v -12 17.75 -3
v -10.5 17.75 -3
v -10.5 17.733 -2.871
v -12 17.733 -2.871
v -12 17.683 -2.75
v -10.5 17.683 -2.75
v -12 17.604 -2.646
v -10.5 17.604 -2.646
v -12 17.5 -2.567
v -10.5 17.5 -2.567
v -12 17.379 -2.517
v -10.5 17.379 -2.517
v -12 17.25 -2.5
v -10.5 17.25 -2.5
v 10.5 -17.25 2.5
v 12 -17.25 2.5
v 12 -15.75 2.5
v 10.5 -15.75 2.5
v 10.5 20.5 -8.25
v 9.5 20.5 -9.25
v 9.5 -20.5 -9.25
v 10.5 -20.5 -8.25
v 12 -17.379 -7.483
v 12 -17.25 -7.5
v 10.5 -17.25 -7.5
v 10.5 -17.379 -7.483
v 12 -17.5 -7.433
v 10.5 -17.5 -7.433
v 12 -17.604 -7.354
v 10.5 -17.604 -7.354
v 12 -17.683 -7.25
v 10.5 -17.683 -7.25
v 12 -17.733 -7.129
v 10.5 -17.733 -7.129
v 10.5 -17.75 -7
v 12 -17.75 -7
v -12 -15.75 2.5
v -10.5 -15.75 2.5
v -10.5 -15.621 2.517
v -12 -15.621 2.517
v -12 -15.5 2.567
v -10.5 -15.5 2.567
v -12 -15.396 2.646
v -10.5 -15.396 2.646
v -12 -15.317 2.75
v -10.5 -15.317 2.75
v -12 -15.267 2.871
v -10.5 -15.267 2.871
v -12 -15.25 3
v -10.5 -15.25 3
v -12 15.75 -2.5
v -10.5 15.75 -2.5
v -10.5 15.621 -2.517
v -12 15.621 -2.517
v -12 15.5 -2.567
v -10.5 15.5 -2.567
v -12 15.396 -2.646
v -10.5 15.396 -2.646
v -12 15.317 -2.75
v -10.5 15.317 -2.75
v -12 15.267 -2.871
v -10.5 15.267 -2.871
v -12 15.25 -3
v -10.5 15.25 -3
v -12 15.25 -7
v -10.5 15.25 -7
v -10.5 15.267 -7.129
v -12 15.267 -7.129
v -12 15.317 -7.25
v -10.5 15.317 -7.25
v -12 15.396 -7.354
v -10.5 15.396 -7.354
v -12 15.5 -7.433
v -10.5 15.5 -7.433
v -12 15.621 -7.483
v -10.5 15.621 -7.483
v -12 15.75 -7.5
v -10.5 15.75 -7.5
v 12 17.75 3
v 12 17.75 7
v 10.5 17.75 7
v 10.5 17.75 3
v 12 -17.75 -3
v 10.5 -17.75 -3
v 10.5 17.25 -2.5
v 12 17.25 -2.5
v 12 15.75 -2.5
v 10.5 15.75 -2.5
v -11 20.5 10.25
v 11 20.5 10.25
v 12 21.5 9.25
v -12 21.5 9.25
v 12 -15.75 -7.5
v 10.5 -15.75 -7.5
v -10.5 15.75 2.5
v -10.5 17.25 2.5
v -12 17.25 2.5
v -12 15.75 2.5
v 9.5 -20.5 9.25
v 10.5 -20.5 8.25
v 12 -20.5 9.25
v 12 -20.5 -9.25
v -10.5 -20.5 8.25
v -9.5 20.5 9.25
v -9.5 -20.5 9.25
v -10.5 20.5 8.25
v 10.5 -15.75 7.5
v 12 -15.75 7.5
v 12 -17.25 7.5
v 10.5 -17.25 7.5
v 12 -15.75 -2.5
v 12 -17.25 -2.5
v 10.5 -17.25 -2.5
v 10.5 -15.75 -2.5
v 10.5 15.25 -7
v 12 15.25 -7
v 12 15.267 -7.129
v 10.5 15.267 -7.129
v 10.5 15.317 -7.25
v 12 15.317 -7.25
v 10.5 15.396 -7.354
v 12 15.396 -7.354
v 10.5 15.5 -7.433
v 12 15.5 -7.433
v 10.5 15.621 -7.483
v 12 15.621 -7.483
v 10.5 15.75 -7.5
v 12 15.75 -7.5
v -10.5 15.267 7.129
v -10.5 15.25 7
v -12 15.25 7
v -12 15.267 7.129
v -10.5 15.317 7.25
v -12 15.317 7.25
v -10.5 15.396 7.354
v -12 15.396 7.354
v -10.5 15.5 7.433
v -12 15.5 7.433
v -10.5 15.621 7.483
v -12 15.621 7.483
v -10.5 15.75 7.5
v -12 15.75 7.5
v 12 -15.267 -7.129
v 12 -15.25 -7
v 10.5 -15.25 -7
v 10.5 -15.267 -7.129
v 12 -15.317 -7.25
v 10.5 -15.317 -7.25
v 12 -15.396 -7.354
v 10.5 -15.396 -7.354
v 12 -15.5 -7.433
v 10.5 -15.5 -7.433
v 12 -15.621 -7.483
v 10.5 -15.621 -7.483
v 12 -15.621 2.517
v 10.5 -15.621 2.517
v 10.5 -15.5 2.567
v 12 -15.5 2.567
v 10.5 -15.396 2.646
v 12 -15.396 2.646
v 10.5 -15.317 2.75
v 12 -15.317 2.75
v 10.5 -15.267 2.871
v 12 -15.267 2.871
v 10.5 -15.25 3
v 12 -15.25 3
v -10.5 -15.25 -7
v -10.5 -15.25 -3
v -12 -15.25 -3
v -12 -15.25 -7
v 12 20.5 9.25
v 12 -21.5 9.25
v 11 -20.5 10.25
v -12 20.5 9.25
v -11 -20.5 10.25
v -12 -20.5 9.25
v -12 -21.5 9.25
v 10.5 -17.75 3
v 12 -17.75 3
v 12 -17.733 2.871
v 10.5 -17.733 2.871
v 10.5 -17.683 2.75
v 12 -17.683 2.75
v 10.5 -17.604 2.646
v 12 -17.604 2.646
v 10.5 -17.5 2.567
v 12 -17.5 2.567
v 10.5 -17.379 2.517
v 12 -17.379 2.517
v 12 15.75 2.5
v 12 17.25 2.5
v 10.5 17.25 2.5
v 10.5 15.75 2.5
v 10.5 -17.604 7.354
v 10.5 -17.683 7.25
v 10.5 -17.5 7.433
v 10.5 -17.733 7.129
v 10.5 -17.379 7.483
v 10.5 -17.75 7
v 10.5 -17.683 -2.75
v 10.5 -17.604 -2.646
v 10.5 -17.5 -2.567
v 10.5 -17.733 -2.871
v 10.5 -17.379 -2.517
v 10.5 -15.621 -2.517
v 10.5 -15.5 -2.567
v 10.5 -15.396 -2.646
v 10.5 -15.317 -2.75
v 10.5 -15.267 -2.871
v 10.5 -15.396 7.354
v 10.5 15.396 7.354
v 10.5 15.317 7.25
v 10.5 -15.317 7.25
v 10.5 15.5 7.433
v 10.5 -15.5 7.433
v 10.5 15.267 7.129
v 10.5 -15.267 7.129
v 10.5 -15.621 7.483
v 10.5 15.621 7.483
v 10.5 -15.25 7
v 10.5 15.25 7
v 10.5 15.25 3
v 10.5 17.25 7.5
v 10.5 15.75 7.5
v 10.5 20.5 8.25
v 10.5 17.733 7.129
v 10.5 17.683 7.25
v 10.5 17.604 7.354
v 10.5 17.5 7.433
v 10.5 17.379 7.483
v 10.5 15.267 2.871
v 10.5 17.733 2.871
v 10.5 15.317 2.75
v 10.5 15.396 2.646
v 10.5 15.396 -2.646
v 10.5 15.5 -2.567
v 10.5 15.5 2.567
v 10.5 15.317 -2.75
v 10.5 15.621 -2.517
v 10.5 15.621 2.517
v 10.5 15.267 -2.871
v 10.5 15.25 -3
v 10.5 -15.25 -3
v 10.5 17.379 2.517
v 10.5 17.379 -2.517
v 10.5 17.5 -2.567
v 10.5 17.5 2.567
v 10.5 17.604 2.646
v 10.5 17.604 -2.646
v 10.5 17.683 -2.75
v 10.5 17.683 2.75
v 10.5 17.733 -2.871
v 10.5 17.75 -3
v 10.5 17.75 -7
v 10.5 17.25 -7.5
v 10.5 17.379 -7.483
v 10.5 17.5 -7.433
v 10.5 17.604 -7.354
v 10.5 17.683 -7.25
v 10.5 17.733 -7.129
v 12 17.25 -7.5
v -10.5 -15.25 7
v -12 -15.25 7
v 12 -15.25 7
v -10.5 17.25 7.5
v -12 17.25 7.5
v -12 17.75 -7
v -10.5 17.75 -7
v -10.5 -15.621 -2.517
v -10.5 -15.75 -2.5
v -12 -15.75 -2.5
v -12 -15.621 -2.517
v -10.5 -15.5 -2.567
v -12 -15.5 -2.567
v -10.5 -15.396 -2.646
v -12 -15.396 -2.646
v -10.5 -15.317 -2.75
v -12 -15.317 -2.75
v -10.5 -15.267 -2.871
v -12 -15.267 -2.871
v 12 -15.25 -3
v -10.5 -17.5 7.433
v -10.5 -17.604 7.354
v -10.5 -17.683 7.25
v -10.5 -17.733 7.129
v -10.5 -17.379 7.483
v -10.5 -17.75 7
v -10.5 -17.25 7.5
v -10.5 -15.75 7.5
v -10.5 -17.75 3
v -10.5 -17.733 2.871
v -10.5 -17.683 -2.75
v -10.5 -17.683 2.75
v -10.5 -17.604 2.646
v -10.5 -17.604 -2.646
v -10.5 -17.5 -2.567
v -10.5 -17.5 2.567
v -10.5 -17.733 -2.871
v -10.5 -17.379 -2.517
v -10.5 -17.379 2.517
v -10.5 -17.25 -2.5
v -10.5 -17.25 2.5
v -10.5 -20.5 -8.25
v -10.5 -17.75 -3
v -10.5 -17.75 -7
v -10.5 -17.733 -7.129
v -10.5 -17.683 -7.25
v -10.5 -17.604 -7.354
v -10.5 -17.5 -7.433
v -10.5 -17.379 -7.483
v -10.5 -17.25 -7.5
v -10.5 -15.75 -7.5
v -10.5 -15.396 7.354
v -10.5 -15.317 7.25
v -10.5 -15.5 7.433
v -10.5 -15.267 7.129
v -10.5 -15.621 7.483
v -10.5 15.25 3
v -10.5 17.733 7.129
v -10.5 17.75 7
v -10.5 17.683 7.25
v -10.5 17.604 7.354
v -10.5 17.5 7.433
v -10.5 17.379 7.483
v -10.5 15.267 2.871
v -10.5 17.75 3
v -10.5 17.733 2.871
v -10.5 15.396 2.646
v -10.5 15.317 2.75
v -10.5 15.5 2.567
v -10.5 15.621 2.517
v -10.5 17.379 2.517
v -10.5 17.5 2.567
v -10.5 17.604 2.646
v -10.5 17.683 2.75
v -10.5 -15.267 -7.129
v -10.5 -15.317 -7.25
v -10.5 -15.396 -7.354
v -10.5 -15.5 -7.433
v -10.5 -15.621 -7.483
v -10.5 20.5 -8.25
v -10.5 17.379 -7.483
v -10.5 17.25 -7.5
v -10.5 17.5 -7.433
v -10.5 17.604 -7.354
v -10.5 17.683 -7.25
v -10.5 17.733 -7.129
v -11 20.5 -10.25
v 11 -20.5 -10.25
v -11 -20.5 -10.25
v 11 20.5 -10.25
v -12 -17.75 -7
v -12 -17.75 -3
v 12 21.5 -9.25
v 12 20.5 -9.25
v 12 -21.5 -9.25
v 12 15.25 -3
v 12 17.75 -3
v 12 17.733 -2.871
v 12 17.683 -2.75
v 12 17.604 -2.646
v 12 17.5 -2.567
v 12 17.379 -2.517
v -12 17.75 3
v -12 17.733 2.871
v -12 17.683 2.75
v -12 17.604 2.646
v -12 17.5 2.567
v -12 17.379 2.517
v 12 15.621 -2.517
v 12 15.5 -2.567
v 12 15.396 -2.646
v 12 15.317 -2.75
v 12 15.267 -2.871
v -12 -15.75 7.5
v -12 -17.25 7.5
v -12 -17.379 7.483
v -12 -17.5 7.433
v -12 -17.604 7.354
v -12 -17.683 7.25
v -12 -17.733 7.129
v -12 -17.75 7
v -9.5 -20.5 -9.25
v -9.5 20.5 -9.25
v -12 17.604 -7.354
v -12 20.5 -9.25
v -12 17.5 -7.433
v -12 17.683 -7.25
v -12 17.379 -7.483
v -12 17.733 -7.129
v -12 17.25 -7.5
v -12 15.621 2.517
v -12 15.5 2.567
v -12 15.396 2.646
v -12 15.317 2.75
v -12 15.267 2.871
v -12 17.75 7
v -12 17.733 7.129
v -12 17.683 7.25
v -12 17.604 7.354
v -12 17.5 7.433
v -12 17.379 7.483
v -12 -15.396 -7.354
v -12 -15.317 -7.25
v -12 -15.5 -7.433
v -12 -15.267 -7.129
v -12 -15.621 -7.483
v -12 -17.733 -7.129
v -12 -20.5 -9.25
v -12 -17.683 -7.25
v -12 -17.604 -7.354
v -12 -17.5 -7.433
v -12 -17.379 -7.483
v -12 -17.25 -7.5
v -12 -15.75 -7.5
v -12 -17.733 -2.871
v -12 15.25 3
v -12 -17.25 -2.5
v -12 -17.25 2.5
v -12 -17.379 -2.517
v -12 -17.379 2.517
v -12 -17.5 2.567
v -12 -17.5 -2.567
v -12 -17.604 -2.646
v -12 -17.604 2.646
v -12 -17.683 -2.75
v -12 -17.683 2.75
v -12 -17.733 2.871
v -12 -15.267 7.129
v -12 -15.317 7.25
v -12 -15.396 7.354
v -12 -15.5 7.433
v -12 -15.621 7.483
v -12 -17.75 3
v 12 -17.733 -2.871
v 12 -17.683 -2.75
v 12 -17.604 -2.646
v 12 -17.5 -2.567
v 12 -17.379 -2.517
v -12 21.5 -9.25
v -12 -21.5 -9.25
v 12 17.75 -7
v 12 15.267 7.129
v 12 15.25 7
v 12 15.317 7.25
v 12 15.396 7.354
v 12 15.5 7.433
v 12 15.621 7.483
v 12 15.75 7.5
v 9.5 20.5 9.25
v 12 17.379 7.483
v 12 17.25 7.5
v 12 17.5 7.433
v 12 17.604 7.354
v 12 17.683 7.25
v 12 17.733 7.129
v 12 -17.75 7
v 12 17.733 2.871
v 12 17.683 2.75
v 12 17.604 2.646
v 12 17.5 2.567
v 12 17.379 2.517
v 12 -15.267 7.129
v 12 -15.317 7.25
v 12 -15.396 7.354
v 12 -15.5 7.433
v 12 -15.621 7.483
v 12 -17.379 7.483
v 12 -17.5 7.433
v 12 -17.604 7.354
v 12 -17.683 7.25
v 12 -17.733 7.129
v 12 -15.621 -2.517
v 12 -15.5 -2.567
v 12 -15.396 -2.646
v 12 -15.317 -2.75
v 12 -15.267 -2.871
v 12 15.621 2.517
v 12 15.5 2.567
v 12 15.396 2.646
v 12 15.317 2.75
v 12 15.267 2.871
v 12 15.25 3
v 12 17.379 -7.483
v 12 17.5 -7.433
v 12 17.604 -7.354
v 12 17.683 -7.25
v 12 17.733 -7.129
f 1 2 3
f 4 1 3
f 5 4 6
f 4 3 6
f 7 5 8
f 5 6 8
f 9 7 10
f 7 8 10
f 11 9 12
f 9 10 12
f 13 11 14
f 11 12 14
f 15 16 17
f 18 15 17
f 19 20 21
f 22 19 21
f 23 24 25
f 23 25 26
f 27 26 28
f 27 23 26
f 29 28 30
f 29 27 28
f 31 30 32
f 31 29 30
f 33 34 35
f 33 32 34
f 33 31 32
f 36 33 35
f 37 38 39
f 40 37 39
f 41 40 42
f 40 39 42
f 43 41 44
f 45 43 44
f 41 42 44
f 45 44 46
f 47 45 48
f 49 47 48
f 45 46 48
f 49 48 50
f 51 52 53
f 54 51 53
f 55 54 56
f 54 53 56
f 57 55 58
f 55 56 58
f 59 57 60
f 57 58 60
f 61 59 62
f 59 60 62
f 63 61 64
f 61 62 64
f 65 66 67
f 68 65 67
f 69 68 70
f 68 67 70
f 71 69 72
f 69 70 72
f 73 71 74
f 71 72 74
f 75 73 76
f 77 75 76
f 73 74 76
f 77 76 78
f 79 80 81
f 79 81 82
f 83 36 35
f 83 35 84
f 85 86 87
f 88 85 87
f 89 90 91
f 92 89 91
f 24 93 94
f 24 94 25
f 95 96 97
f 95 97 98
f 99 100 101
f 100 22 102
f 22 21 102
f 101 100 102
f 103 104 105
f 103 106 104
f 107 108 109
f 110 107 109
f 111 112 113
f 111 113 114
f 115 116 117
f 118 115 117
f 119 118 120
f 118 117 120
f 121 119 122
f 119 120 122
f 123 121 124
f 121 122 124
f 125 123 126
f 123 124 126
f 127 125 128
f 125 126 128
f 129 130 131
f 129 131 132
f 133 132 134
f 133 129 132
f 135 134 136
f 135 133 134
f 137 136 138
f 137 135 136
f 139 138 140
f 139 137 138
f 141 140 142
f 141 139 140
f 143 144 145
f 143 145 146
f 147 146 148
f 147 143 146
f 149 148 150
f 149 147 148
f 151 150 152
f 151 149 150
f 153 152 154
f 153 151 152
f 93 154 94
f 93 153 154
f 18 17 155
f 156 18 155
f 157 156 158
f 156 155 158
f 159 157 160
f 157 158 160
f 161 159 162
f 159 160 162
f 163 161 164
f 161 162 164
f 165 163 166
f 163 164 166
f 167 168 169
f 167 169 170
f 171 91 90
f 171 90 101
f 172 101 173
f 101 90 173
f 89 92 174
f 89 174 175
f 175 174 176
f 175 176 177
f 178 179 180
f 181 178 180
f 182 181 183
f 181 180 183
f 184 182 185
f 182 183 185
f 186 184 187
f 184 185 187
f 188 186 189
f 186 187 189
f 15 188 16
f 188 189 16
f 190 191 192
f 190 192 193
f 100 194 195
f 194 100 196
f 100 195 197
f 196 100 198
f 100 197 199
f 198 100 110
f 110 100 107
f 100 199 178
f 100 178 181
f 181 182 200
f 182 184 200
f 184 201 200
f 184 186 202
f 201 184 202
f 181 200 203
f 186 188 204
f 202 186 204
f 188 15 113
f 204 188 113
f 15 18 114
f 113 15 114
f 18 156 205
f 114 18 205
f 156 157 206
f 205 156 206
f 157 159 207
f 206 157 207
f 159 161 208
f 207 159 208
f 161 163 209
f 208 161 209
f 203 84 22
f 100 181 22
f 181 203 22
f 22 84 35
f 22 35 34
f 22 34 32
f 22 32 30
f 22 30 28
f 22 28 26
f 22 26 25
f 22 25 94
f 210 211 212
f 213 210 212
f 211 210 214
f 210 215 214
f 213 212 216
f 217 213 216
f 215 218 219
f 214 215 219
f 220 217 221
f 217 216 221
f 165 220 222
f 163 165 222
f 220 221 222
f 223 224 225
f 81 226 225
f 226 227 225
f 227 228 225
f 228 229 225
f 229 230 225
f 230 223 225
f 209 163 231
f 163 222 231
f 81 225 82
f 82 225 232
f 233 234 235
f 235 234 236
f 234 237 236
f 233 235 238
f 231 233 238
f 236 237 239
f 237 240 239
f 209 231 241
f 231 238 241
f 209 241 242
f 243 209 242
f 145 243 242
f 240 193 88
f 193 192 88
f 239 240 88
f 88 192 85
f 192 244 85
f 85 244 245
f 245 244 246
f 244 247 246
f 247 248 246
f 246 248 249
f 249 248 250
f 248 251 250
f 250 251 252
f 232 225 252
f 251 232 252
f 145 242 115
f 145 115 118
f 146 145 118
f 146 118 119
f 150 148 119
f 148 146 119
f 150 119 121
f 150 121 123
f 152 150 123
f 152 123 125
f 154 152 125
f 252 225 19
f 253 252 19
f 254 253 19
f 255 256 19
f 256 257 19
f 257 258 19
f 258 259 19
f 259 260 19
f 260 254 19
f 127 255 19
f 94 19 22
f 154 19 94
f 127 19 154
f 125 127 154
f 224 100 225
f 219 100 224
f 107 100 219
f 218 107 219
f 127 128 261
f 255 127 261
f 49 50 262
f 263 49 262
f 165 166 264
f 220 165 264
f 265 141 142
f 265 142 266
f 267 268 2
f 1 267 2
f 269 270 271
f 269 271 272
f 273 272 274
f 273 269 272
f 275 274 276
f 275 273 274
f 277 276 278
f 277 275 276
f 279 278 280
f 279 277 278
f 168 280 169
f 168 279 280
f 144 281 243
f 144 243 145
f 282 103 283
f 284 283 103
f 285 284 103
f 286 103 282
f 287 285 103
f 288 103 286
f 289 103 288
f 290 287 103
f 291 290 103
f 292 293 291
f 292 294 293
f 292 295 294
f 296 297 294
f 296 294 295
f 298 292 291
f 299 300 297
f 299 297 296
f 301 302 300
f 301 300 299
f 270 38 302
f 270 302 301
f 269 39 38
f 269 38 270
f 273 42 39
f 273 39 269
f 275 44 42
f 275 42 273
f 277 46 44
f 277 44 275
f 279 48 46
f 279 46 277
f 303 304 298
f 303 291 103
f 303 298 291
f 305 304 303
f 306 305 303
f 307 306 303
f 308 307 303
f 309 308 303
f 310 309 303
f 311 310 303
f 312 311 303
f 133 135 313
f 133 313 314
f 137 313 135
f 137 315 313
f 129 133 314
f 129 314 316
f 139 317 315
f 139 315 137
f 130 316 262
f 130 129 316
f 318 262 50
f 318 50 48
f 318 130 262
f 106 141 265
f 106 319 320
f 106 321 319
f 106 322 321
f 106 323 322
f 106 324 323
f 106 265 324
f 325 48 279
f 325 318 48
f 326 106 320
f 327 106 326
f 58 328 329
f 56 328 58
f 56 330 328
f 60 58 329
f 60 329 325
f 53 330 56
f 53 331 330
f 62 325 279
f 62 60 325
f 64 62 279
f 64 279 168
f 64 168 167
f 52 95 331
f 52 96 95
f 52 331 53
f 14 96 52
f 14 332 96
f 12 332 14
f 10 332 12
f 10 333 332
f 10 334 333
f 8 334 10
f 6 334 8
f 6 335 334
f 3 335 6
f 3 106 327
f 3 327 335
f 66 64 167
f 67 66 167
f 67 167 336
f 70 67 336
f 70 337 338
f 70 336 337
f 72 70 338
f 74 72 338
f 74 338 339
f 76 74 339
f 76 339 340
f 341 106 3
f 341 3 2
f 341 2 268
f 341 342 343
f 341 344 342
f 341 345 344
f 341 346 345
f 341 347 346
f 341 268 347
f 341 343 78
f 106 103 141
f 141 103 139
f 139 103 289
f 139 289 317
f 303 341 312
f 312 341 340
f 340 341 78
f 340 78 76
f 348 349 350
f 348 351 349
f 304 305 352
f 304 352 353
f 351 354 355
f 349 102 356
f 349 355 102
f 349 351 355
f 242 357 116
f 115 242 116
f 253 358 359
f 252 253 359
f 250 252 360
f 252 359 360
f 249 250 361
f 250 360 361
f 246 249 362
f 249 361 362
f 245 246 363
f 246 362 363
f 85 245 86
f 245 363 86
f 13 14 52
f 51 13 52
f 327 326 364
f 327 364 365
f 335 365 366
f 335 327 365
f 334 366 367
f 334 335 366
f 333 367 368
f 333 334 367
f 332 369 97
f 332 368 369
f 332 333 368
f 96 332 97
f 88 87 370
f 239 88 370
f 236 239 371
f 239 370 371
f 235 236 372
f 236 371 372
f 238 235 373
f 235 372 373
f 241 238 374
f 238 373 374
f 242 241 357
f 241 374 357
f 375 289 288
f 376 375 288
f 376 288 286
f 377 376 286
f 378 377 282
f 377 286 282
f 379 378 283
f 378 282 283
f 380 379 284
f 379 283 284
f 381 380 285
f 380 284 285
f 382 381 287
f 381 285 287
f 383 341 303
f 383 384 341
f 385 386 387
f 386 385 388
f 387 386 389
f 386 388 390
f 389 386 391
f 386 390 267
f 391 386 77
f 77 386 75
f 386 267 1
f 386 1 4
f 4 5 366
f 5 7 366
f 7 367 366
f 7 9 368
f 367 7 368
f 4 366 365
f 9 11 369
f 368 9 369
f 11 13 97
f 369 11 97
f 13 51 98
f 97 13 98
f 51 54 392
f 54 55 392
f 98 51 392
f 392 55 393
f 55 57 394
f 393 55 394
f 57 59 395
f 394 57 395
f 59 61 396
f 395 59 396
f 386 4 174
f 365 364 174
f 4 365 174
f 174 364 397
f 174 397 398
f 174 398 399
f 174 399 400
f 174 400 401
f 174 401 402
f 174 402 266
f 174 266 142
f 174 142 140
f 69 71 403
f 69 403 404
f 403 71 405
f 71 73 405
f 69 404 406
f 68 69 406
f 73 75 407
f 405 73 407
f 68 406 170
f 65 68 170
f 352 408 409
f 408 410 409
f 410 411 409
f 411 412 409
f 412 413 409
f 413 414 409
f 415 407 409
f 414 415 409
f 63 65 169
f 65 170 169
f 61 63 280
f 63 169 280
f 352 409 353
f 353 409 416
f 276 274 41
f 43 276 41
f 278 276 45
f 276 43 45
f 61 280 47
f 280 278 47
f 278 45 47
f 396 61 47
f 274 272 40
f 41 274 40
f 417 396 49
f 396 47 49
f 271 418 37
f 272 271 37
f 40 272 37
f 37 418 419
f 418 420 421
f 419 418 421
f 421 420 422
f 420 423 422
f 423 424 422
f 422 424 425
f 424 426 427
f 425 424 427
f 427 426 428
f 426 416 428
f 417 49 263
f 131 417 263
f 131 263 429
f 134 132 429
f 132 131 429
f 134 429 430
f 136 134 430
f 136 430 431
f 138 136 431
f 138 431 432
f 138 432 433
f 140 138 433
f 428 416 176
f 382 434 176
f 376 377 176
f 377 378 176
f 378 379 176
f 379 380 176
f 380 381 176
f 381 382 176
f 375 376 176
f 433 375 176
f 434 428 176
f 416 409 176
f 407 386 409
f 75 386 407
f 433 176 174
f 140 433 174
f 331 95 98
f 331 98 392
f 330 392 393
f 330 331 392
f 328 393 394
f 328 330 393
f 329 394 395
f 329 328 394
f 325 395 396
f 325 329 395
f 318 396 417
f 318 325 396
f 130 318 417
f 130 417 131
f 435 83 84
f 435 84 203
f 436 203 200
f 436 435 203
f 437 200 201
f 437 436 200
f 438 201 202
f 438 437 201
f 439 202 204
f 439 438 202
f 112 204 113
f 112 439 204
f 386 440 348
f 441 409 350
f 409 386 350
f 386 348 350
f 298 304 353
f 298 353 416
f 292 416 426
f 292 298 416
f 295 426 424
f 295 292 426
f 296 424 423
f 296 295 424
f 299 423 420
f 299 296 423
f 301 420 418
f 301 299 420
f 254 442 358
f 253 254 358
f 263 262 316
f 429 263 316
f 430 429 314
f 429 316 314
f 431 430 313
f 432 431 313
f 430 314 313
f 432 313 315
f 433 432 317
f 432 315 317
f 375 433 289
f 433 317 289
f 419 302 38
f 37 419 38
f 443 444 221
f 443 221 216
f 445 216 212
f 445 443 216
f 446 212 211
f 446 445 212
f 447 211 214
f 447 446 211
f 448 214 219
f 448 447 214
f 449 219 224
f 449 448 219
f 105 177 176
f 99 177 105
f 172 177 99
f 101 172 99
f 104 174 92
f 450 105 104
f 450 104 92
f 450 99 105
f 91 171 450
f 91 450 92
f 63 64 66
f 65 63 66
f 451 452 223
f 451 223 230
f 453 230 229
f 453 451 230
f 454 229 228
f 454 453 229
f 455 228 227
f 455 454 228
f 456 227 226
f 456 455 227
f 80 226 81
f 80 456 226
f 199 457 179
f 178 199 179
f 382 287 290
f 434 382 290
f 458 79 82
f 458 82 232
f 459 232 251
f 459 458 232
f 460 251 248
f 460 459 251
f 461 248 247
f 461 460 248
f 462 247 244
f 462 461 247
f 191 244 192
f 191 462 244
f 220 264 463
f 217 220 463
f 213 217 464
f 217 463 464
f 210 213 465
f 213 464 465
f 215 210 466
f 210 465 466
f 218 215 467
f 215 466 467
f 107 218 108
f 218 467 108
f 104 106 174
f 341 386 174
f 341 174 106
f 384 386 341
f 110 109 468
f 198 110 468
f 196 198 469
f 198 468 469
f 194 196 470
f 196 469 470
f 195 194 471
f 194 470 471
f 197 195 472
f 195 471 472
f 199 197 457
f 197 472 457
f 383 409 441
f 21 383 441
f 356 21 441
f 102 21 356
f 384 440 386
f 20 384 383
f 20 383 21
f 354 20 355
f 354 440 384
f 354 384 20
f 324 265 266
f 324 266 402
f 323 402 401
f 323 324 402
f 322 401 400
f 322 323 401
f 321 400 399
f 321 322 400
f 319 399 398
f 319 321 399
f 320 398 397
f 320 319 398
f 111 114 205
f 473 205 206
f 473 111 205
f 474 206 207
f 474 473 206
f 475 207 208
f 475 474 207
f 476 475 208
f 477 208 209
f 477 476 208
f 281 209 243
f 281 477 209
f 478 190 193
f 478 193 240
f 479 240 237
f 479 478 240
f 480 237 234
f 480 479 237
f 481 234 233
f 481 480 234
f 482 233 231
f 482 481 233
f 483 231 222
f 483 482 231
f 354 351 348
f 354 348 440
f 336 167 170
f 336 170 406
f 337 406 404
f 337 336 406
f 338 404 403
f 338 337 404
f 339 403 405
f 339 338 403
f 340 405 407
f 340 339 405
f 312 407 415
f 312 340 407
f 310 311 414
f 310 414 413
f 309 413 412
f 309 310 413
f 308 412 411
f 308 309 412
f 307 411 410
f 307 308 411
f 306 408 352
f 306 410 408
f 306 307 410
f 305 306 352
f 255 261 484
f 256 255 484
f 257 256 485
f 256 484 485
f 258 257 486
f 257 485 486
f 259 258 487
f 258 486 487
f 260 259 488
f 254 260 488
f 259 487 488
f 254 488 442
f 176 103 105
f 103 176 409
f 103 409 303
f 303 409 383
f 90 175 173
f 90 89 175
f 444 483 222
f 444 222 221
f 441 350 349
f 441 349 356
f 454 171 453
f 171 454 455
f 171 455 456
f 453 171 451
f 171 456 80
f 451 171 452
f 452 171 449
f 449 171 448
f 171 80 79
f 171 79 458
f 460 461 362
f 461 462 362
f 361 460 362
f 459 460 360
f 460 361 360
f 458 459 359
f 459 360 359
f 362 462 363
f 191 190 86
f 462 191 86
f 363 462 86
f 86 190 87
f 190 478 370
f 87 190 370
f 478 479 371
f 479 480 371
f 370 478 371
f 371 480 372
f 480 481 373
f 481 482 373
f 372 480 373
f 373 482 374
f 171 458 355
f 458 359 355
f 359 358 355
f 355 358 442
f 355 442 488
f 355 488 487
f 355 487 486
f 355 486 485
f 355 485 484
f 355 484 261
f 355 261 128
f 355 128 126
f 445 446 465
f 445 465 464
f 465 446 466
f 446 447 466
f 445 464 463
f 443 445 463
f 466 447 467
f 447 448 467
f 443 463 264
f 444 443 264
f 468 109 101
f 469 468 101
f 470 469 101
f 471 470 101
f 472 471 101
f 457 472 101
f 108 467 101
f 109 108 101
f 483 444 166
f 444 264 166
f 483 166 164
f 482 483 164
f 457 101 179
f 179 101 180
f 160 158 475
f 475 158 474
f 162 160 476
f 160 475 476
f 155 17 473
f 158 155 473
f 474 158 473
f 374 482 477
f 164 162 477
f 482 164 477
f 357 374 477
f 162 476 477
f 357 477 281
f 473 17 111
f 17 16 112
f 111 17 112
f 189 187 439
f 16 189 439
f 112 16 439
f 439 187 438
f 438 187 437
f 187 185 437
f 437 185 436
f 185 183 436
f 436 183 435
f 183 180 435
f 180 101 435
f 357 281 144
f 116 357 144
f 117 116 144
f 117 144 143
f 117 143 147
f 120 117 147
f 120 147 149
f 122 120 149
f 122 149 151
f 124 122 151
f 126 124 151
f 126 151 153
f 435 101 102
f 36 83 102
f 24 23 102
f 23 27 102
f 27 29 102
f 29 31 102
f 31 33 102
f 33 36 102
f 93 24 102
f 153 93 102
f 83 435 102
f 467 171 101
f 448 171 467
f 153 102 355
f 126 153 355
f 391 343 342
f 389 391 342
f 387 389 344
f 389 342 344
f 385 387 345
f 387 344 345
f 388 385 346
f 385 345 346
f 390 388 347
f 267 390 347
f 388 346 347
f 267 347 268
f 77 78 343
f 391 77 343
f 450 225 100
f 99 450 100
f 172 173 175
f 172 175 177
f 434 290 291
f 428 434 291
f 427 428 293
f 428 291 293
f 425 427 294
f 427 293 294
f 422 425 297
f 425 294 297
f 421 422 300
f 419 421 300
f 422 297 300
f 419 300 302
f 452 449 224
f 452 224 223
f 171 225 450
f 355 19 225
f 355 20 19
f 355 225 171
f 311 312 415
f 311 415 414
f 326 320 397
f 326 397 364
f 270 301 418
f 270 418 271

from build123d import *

# Parameters (mm, degrees)
SKETCH2_W                       = 20.999999999999993
SKETCH2_H                       = 18.500000000000007
BOSS_EXTRUDE2_DEPTH             = 20.5
BOSS_EXTRUDE5_REACH             = 27.871
BOSS_EXTRUDE5_DIRECTION_2_REACH = 27.871
CUT_EXTRUDE1_DEPTH              = 34.81290434139014
CHAMFER1_SIZE                   = 1
CHAMFER1_OF_MIRROR1_SIZE        = 1


with BuildPart() as part:
    # Sketch2 → Boss-Extrude2 (new body)
    with BuildSketch(Plane(origin=(0, 0, 0), x_dir=(1, 0, 0), z_dir=(0, 1, 0))):
        Polygon((-11.999999999999991, -10.249999999999988), (12, -10.249999999999982), (11.999999999999998, 10.249999999999982), (-11.999999999999991, 10.249999999999979), align=None)
        Rectangle(SKETCH2_W, SKETCH2_H, mode=Mode.SUBTRACT)
    boss_extrude2 = extrude(amount=BOSS_EXTRUDE2_DEPTH)

    # Boss-Extrude5: up to this face of the body (flat: up to its plane)
    boss_extrude5_end = Plane(part.part.faces().sort_by_distance((12, 10.25, 0))[0])
    # Sketch4 → Boss-Extrude5 (add, up to the picked face)
    with BuildSketch(Plane(origin=(0, 0, 0), x_dir=(0, 0, -1), z_dir=(1, 0, 0)), mode=Mode.PRIVATE) as boss_extrude5_sk1:
        Polygon((-10.249999999999982, 20.5), (-9.249999999999988, 21.5), (-9.249999999999988, 20.5), align=None)
    boss_extrude5_tool1 = split(extrude(boss_extrude5_sk1.sketch, amount=BOSS_EXTRUDE5_REACH, mode=Mode.PRIVATE), bisect_by=boss_extrude5_end, keep=Keep.BOTH, mode=Mode.PRIVATE)
    # Sketch4 → Boss-Extrude5 (add, up to the picked face)
    with BuildSketch(Plane(origin=(0, 0, 0), x_dir=(0, 0, -1), z_dir=(1, 0, 0)), mode=Mode.PRIVATE) as boss_extrude5_sk2:
        Polygon((10.25, 20.500000000000004), (9.250000000000005, 21.500000000000004), (9.250000000000005, 20.500000000000004), align=None)
    boss_extrude5_tool2 = split(extrude(boss_extrude5_sk2.sketch, amount=BOSS_EXTRUDE5_REACH, mode=Mode.PRIVATE), bisect_by=boss_extrude5_end, keep=Keep.BOTH, mode=Mode.PRIVATE)
    boss_extrude5_1 = boss_extrude5_tool1.solids().sort_by(Axis((0, 20.833333, 9.583333), (1, 0, 0)))[0]
    add(boss_extrude5_1)
    boss_extrude5_2 = boss_extrude5_tool2.solids().sort_by(Axis((0, 20.833333, -9.583333), (1, 0, 0)))[0]
    add(boss_extrude5_2)
    boss_extrude5 = boss_extrude5_1 + boss_extrude5_2  # Boss-Extrude5 as one shape, for the pattern or mirror that repeats it

    # Boss-Extrude5 direction 2: up to this face of the body (flat: up to its plane)
    boss_extrude5_direction_2_end = Plane(part.part.faces().sort_by_distance((-12, 10.25, 0))[0])
    # Sketch4 → Boss-Extrude5 direction 2 (add, up to the picked face)
    with BuildSketch(Plane(origin=(0, 0, 0), x_dir=(0, 0, -1), z_dir=(1, 0, 0)), mode=Mode.PRIVATE) as boss_extrude5_direction_2_sk1:
        Polygon((-10.249999999999982, 20.5), (-9.249999999999988, 21.5), (-9.249999999999988, 20.5), align=None)
    boss_extrude5_direction_2_tool1 = split(extrude(boss_extrude5_direction_2_sk1.sketch, amount=-BOSS_EXTRUDE5_DIRECTION_2_REACH, mode=Mode.PRIVATE), bisect_by=boss_extrude5_direction_2_end, keep=Keep.BOTH, mode=Mode.PRIVATE)
    # Sketch4 → Boss-Extrude5 direction 2 (add, up to the picked face)
    with BuildSketch(Plane(origin=(0, 0, 0), x_dir=(0, 0, -1), z_dir=(1, 0, 0)), mode=Mode.PRIVATE) as boss_extrude5_direction_2_sk2:
        Polygon((10.25, 20.500000000000004), (9.250000000000005, 21.500000000000004), (9.250000000000005, 20.500000000000004), align=None)
    boss_extrude5_direction_2_tool2 = split(extrude(boss_extrude5_direction_2_sk2.sketch, amount=-BOSS_EXTRUDE5_DIRECTION_2_REACH, mode=Mode.PRIVATE), bisect_by=boss_extrude5_direction_2_end, keep=Keep.BOTH, mode=Mode.PRIVATE)
    boss_extrude5_direction_2_1 = boss_extrude5_direction_2_tool1.solids().sort_by(Axis((0, 20.833333, 9.583333), (-1, 0, 0)))[0]
    add(boss_extrude5_direction_2_1)
    boss_extrude5_direction_2_2 = boss_extrude5_direction_2_tool2.solids().sort_by(Axis((0, 20.833333, -9.583333), (-1, 0, 0)))[0]
    add(boss_extrude5_direction_2_2)
    boss_extrude5_direction_2 = boss_extrude5_direction_2_1 + boss_extrude5_direction_2_2  # Boss-Extrude5 direction 2 as one shape, for the pattern or mirror that repeats it

    # Sketch5 → Cut-Extrude1 (cut, through all)
    with BuildSketch(Plane(origin=(11.999999999999998, 0, -1.02e-15), x_dir=(0, 0, -1), z_dir=(1, 0, 0))):
        with BuildLine():
            Line((-6.9999999999999885, 17.750000000000004), (-2.9999999999999893, 17.750000000000004))
            ThreePointArc((-2.9999999999999893, 17.750000000000004), (-2.646446609406713, 17.603553390593277), (-2.4999999999999893, 17.25))
            Line((-2.4999999999999893, 17.25), (-2.4999999999999893, 15.75))
            ThreePointArc((-2.4999999999999893, 15.75), (-2.6464466094067154, 15.396446609406727), (-2.9999999999999893, 15.250000000000002))
            Line((-2.9999999999999893, 15.250000000000002), (-6.9999999999999885, 15.250000000000002))
            ThreePointArc((-6.9999999999999885, 15.250000000000002), (-7.353553390593261, 15.396446609406727), (-7.4999999999999885, 15.75))
            Line((-7.4999999999999885, 15.75), (-7.49999999999999, 17.25))
            ThreePointArc((-7.49999999999999, 17.25), (-7.353553390593265, 17.603553390593277), (-6.9999999999999885, 17.750000000000004))
        make_face()
        with BuildLine():
            Line((7.00000000000001, 17.750000000000004), (3.000000000000011, 17.750000000000004))
            ThreePointArc((3.000000000000011, 17.750000000000004), (2.646446609406735, 17.603553390593277), (2.500000000000011, 17.25))
            Line((2.500000000000011, 17.25), (2.500000000000011, 15.75))
            ThreePointArc((2.500000000000011, 15.75), (2.6464466094067376, 15.396446609406725), (3.000000000000012, 15.250000000000002))
            Line((3.000000000000012, 15.250000000000002), (7.0000000000000115, 15.250000000000004))
            ThreePointArc((7.0000000000000115, 15.250000000000004), (7.353553390593284, 15.39644660940673), (7.500000000000011, 15.750000000000004))
            Line((7.500000000000011, 15.750000000000004), (7.500000000000012, 17.250000000000004))
            ThreePointArc((7.500000000000012, 17.250000000000004), (7.3535533905932855, 17.603553390593277), (7.00000000000001, 17.750000000000004))
        make_face()
    cut_extrude1 = extrude(amount=-CUT_EXTRUDE1_DEPTH, mode=Mode.SUBTRACT)

    # Chamfer1
    chamfer1_edges = [part.edges().sort_by_distance(p)[0] for p in [
        (-11.999999999999991, 10.25, -10.249999999999979),
        (11.999999999999998, 10.25, -10.249999999999982),
        (12, 10.25, 10.249999999999982),
        (-11.999999999999991, 10.25, 10.249999999999988),
        (10.5, 10.25, -9.250000000000018),
        (-10.499999999999991, 10.25, -9.250000000000018),
        (-10.499999999999991, 10.25, 9.249999999999988),
        (10.5, 10.25, 9.249999999999988),
    ]]
    chamfer(chamfer1_edges, length=CHAMFER1_SIZE)


with BuildPart() as mirror1_1:
    # Mirror1: Boss-Extrude2, Boss-Extrude5, Boss-Extrude5 direction 2 across plane
    add(boss_extrude2.mirror(Plane.ZX))
    add(boss_extrude5.mirror(Plane.ZX))
    add(boss_extrude5_direction_2.mirror(Plane.ZX))

    # Mirror1 2: Cut-Extrude1 across plane
    add(cut_extrude1.mirror(Plane.ZX), mode=Mode.SUBTRACT)

    # Chamfer1 of Mirror1
    chamfer1_of_mirror1_edges = [mirror1_1.edges().sort_by_distance(p)[0] for p in [
        (-11.999999999999991, -10.25, -10.249999999999979),
        (11.999999999999998, -10.25, -10.249999999999982),
        (12, -10.25, 10.249999999999982),
        (-11.999999999999991, -10.25, 10.249999999999988),
        (10.5, -10.25, -9.250000000000018),
        (-10.499999999999991, -10.25, -9.250000000000018),
        (-10.499999999999991, -10.25, 9.249999999999988),
        (10.5, -10.25, 9.249999999999988),
    ]]
    chamfer(chamfer1_of_mirror1_edges, length=CHAMFER1_OF_MIRROR1_SIZE)


with BuildPart() as part_1:
    add(part.part)

    # Mirror1 united with what the copies touc: union Mirror1_1
    add(mirror1_1.part)


solid = part_1.part
